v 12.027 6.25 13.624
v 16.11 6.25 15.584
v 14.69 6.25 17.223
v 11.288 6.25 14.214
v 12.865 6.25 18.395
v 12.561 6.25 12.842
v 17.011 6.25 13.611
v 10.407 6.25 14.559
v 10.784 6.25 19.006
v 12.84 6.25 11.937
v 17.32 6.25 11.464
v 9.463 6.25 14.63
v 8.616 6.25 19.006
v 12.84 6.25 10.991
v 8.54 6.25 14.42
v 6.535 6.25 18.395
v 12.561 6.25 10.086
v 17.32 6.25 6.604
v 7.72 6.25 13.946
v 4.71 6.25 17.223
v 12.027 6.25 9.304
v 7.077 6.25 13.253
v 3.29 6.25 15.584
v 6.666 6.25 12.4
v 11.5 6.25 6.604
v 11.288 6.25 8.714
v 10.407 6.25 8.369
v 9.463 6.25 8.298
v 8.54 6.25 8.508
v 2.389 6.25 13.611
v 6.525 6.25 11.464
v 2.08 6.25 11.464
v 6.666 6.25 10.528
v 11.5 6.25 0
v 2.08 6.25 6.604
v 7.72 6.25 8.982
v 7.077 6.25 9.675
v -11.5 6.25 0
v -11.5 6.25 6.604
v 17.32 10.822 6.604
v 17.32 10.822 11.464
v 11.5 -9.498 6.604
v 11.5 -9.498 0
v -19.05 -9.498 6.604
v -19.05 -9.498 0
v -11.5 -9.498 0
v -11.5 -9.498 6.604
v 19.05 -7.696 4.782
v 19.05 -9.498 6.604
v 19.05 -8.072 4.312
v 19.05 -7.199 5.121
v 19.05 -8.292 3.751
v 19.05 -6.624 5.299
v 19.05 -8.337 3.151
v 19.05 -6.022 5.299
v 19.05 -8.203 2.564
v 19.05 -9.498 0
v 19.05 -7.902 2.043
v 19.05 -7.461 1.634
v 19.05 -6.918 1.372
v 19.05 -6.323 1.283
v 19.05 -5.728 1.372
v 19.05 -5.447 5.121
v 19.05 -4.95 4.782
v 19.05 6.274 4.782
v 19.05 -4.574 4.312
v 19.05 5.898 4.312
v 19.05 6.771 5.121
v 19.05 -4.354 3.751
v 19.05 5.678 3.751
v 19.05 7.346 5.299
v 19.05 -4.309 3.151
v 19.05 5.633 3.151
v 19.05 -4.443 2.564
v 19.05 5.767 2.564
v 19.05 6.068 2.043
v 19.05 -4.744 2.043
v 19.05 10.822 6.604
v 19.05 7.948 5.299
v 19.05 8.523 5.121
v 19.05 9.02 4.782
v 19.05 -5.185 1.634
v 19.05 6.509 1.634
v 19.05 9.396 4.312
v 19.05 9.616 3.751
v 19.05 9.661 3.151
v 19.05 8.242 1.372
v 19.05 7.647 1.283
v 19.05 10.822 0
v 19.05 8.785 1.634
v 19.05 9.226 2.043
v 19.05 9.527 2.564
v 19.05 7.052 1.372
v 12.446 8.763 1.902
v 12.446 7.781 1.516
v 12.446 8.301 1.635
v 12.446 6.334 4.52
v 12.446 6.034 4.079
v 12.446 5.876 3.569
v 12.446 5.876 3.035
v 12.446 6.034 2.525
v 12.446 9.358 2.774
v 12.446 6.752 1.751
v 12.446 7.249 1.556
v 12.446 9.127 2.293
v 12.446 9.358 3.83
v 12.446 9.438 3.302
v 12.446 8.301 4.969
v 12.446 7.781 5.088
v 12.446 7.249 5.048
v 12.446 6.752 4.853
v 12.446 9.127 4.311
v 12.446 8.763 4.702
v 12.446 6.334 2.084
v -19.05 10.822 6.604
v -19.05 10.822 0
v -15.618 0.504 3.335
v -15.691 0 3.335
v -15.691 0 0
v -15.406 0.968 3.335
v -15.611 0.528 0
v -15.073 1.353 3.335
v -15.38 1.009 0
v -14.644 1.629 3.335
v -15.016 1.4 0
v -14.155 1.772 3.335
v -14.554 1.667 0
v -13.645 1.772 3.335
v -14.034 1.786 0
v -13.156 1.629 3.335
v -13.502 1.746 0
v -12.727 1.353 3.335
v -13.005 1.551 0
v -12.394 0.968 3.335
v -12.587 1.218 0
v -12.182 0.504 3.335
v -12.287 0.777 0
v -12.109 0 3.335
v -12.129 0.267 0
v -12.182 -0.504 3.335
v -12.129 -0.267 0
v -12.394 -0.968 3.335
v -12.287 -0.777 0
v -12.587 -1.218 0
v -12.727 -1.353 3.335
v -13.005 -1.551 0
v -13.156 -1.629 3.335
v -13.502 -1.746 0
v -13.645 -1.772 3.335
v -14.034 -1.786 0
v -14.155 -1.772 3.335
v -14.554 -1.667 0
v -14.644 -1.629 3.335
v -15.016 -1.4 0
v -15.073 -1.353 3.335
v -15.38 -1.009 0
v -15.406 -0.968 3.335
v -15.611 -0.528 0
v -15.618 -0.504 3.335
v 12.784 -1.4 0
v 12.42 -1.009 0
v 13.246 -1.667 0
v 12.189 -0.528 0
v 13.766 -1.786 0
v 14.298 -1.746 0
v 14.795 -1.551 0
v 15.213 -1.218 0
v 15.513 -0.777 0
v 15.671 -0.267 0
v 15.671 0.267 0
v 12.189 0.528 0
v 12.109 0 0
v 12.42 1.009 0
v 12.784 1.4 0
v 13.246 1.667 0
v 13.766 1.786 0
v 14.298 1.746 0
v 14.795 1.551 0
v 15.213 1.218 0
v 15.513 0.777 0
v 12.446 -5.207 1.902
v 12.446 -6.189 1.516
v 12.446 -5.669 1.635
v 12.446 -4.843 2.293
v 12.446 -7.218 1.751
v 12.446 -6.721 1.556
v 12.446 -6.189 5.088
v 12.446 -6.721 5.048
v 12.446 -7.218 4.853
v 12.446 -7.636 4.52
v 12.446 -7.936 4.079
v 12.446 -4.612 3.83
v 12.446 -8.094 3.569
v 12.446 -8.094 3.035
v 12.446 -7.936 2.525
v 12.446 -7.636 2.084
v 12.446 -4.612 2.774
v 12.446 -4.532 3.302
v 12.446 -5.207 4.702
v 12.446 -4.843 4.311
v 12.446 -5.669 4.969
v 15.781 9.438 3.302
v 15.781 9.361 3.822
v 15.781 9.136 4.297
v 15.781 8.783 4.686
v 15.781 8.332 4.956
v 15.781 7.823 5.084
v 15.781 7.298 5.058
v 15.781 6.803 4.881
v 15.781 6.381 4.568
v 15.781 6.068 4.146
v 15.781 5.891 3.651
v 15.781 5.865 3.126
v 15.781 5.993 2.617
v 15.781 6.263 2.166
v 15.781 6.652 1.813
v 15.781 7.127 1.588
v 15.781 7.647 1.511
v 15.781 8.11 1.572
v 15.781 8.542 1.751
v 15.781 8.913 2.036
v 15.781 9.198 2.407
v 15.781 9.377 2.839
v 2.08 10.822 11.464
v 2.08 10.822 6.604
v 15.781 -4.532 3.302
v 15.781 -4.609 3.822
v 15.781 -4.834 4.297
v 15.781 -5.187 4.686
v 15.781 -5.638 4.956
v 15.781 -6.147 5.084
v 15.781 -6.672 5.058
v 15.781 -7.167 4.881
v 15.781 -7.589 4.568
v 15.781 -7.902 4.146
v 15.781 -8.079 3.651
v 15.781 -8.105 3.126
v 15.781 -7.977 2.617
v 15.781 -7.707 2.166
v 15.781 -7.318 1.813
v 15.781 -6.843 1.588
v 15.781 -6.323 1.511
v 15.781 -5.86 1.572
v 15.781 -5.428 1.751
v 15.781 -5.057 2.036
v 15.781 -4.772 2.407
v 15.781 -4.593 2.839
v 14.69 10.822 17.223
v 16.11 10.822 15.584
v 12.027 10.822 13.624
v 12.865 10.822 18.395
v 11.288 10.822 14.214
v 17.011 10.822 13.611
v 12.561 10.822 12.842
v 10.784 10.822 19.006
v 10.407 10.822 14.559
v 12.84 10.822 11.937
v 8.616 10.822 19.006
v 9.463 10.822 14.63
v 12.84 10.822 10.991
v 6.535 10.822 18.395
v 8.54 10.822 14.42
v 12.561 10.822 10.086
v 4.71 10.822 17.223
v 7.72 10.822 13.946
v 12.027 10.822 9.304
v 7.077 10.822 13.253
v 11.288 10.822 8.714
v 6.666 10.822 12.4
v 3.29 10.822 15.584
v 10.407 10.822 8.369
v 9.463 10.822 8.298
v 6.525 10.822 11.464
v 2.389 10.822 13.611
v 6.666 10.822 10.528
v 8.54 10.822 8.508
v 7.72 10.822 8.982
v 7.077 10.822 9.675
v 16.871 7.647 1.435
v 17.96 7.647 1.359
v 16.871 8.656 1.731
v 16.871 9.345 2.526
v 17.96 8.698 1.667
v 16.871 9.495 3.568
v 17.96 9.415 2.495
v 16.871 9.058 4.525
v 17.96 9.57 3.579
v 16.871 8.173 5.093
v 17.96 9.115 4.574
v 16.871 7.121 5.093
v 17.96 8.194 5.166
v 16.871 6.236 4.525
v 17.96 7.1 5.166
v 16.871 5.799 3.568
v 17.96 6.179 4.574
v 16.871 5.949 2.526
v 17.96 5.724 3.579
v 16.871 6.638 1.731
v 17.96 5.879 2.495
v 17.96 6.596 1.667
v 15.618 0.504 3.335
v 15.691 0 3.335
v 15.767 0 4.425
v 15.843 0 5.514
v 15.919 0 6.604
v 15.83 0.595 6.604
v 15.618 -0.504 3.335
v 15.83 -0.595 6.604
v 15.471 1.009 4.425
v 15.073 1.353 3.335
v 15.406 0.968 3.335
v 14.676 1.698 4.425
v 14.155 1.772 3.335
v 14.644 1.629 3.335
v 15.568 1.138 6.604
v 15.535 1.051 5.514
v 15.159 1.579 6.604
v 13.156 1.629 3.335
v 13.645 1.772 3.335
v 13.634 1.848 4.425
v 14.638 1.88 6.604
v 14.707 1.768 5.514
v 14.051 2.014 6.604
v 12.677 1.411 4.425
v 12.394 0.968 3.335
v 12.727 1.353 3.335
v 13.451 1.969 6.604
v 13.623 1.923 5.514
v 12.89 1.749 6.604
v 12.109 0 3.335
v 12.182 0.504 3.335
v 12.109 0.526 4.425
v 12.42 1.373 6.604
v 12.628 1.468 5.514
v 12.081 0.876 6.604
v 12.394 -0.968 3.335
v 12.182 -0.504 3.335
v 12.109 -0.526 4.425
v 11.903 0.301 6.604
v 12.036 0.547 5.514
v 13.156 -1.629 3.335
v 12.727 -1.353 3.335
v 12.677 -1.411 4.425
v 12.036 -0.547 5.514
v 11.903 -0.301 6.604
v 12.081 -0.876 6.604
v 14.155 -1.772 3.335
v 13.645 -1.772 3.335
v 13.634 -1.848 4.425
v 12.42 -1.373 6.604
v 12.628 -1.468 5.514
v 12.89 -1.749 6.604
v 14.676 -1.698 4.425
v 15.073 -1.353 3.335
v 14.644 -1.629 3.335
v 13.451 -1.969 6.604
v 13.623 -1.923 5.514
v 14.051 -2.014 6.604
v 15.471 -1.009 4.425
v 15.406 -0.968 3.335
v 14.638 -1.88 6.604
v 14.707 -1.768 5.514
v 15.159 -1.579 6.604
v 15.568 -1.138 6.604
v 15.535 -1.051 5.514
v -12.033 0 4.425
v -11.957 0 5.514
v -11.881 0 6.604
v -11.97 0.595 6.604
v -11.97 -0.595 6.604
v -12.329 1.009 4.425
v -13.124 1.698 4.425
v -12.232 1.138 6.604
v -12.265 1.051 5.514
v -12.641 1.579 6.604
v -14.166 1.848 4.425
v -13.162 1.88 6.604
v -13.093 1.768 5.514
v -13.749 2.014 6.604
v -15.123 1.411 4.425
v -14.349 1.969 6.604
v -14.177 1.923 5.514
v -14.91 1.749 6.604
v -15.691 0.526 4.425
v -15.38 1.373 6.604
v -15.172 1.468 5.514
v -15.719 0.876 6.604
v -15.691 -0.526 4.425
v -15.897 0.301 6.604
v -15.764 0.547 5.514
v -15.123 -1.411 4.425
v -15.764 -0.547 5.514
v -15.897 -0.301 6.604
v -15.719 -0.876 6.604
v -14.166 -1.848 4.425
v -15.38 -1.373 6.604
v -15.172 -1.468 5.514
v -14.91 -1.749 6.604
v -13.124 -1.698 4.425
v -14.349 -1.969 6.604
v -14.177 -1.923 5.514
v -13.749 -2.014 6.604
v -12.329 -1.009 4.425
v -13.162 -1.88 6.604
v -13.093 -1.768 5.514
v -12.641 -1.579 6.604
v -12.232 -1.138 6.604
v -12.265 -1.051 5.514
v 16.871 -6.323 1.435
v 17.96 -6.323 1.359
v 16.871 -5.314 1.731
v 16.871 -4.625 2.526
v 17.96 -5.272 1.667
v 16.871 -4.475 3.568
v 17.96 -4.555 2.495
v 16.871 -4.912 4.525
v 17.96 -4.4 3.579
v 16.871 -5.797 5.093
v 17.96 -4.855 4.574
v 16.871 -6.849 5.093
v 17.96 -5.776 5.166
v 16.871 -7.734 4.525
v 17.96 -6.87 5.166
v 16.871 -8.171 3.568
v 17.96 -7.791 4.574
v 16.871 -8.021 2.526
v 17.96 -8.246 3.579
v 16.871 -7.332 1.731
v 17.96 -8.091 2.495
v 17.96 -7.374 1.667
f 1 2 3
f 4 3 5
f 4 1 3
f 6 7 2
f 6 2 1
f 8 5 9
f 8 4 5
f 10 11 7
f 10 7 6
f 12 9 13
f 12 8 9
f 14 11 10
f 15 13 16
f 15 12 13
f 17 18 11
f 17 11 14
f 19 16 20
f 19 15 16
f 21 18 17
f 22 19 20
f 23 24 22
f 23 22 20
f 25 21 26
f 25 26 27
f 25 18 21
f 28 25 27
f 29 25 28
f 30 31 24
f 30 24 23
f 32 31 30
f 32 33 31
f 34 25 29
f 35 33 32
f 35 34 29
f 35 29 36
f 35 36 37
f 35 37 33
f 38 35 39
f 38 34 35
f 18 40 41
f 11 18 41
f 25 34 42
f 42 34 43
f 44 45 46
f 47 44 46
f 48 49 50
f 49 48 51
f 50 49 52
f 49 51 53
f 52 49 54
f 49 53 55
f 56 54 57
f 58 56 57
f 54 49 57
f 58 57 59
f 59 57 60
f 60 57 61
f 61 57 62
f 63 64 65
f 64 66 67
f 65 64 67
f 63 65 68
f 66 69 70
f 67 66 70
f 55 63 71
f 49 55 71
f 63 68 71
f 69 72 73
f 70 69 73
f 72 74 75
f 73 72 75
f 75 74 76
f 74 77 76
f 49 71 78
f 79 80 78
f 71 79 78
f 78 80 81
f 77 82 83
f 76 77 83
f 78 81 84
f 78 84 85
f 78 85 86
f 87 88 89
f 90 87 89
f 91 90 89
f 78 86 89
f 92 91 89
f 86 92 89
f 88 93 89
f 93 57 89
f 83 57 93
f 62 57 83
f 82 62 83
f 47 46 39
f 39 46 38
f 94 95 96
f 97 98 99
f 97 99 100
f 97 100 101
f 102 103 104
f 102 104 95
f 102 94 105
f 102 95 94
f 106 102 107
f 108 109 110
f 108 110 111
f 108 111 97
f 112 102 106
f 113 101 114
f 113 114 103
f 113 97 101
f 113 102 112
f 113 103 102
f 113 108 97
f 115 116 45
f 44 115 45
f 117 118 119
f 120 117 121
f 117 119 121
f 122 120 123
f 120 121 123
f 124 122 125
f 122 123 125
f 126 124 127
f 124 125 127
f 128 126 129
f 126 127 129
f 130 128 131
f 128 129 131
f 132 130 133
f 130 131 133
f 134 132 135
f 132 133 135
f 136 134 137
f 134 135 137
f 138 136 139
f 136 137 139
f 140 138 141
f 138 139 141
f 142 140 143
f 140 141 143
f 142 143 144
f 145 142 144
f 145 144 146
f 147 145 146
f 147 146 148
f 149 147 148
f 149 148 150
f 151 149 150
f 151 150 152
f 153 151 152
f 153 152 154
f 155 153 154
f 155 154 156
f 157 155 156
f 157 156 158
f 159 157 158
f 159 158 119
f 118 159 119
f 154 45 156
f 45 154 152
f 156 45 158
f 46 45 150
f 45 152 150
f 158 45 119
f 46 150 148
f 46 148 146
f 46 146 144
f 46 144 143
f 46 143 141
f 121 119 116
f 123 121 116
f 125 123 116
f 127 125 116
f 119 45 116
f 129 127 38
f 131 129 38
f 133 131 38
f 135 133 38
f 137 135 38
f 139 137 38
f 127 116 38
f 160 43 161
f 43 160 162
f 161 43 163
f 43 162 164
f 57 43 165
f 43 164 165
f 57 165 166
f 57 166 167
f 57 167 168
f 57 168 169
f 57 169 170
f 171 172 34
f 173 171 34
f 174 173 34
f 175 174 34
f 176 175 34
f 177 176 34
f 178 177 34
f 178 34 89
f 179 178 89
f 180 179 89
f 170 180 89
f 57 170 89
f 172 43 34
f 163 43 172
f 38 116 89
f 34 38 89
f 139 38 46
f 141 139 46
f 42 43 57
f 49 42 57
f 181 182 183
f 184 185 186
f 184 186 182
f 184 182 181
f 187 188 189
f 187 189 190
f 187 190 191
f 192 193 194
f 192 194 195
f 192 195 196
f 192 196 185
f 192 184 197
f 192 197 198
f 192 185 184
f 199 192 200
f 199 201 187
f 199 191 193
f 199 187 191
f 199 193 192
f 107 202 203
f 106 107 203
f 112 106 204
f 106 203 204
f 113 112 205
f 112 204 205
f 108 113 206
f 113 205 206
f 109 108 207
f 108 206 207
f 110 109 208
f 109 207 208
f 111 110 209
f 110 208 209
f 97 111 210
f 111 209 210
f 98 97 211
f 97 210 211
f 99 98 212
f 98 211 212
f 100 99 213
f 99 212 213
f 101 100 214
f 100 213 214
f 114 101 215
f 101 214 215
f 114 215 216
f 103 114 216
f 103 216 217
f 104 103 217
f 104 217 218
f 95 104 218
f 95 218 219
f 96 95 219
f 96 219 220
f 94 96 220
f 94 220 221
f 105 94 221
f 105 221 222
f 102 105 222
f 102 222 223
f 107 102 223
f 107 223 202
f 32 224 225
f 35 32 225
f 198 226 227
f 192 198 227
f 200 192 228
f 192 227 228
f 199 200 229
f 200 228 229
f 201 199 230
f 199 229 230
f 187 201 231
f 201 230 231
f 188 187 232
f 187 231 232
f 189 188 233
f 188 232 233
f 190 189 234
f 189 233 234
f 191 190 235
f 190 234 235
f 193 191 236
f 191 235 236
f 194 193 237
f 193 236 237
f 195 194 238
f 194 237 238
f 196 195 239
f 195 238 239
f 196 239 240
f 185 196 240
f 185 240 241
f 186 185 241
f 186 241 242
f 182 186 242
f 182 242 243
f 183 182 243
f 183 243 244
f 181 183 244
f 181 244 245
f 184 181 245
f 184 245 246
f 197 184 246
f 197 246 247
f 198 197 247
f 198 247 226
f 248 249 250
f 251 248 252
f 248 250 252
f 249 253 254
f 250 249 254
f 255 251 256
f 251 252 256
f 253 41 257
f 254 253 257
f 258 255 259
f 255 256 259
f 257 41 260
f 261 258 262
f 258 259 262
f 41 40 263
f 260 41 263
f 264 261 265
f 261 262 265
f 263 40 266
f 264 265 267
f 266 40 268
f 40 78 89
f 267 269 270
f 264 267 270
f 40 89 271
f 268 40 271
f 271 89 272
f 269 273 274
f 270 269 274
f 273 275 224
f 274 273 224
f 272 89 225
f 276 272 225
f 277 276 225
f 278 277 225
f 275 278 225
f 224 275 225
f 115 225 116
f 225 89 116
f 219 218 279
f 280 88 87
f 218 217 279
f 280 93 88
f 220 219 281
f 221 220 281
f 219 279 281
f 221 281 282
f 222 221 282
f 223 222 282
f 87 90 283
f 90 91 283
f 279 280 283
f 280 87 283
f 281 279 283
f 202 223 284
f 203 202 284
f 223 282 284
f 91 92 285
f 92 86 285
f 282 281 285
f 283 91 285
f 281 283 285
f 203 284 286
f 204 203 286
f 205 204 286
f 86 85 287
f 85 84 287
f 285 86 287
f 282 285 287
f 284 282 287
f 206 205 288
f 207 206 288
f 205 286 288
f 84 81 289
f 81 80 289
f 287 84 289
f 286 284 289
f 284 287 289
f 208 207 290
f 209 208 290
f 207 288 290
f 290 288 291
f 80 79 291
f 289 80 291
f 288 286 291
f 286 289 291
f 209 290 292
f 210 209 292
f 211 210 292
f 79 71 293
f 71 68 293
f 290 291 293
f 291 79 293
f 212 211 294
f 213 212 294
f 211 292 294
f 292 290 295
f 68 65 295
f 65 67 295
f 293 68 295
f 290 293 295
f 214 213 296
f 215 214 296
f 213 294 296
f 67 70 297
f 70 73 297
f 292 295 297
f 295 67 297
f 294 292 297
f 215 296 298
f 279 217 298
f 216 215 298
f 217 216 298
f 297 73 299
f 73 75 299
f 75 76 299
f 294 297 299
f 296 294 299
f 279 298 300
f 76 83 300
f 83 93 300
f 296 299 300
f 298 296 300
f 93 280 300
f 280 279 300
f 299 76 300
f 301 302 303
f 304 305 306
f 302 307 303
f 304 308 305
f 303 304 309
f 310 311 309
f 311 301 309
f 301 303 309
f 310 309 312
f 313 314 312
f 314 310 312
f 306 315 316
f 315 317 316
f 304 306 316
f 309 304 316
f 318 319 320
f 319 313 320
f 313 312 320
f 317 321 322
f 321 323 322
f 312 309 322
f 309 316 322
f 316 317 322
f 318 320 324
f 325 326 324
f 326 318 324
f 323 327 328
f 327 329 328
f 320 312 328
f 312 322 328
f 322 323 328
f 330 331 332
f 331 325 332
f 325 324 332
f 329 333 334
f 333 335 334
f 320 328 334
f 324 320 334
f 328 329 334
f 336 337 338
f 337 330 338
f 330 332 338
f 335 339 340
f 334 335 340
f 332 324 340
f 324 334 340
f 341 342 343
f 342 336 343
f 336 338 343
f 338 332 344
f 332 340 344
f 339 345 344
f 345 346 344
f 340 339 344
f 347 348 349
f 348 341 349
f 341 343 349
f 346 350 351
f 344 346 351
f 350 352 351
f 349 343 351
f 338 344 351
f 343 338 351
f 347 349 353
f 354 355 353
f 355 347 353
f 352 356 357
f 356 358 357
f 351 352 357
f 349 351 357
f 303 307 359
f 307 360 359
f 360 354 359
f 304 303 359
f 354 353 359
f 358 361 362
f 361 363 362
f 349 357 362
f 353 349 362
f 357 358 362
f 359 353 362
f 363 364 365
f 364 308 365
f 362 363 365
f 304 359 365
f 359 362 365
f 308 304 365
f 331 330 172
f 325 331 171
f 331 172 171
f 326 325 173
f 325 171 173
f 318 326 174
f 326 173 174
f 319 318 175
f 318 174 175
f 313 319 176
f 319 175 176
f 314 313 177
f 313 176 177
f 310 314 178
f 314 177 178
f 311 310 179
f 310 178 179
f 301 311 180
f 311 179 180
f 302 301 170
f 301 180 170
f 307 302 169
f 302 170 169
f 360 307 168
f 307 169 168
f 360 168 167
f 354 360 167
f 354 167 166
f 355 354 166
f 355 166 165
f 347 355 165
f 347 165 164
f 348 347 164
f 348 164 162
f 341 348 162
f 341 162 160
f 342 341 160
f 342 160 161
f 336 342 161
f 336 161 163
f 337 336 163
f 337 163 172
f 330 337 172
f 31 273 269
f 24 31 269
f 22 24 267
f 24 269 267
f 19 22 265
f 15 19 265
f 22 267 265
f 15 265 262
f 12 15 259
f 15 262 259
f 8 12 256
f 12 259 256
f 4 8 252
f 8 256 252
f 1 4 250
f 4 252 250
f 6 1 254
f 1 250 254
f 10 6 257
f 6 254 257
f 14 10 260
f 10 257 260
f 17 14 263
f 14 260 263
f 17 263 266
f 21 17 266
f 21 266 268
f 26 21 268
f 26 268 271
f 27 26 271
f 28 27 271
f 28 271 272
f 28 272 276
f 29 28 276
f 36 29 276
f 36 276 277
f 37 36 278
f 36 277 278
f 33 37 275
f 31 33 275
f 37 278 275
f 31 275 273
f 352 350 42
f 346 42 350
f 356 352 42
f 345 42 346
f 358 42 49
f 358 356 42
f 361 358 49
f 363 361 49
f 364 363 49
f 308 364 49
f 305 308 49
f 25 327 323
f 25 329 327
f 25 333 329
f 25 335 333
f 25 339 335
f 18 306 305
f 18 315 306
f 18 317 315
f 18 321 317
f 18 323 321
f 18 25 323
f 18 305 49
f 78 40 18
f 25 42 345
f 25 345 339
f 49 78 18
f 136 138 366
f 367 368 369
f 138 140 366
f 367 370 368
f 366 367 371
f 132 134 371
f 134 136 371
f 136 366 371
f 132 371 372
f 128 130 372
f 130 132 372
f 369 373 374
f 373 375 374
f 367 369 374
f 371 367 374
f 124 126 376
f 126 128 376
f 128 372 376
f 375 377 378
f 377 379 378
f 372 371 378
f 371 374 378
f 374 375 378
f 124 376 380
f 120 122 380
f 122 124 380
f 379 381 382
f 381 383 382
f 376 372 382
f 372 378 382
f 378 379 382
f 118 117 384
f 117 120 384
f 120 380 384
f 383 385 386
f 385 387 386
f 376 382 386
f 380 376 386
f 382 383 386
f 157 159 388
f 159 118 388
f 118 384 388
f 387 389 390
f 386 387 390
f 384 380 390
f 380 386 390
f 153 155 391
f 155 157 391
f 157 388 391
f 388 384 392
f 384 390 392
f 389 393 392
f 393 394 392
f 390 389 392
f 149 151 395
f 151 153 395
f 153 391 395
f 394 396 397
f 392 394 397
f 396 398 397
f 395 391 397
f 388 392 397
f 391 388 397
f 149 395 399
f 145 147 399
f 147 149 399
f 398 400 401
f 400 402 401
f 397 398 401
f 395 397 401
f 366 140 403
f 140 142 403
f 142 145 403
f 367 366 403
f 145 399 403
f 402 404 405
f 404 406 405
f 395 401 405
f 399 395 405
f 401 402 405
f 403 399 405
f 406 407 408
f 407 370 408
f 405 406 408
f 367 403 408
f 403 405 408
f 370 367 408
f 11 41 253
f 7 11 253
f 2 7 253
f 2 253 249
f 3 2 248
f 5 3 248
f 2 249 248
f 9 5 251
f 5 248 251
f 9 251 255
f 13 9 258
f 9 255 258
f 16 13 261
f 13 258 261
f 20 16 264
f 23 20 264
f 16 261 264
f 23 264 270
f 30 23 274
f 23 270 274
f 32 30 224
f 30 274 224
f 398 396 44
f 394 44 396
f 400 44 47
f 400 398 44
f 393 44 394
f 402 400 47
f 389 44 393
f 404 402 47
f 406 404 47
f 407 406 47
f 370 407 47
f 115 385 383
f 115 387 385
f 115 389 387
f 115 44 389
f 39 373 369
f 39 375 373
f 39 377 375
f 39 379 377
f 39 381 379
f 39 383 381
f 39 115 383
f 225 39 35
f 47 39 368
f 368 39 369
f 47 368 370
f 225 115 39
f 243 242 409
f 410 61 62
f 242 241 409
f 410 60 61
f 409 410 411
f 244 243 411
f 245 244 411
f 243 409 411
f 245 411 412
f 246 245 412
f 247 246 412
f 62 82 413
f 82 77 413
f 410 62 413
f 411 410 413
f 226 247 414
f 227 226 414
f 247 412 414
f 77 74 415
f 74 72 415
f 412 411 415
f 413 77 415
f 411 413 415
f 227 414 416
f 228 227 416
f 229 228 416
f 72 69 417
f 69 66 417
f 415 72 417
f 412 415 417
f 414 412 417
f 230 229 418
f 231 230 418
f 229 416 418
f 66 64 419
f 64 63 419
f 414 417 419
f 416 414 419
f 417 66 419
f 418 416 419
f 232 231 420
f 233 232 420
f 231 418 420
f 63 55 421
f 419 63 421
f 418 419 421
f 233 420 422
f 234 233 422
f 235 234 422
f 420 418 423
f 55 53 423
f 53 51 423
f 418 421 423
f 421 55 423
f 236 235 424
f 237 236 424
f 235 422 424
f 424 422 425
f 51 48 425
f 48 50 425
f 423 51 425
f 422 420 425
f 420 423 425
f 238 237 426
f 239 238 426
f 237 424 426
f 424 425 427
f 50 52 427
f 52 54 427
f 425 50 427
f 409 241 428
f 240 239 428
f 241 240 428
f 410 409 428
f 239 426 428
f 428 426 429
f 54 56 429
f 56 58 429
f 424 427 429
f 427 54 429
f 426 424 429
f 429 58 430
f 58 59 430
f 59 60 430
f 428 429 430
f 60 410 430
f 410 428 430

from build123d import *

# Parameters (mm, degrees)
BOSS_EXTRUDE1_DEPTH          = 6.604
SKETCH2_R                    = 3.175
BOSS_EXTRUDE2_DEPTH          = 4.572
SKETCH3_R                    = 1.7907
CUT_EXTRUDE1_DEPTH           = 30.055416707
SKETCH4_R                    = 2.0193
CUT_EXTRUDE2_DEPTH           = 26.214451888
CUT_EXTRUDE2_DRAFT           = -4
CUT_EXTRUDE2_PROFILE_2_DEPTH = 26.214451888
CUT_EXTRUDE2_PROFILE_2_DRAFT = -4
SKETCH5_R                    = 1.7907
CUT_EXTRUDE3_DEPTH           = 6.604
SKETCH6_R                    = 2.0193
CUT_EXTRUDE4_DEPTH           = 6.604
CUT_EXTRUDE4_DRAFT           = -4
CUT_EXTRUDE4_PROFILE_2_DEPTH = 6.604
CUT_EXTRUDE4_PROFILE_2_DRAFT = -4


with BuildPart() as part:
    # Sketch1 → Boss-Extrude1 (new body)
    with BuildSketch(Plane.XY):
        Polygon((-11.5, -6.25), (-11.5, 6.25), (11.5, 6.25), (11.5, -6.25), (11.5, -9.498), (19.05, -9.498), (19.05, -6.25), (19.05, 10.822), (-19.05, 10.822), (-19.05, -6.25), (-19.05, -9.498), (-11.5, -9.498), align=None)
    extrude(amount=BOSS_EXTRUDE1_DEPTH)

    # Sketch2 → Boss-Extrude2 (add)
    with BuildSketch(Plane(origin=(0, 10.822, 0), x_dir=(1, 0, 0), z_dir=(0, 1, 0))):
        with BuildLine():
            Line((2.08, -11.464), (2.08, -6.604))
            Line((2.08, -6.604), (17.32, -6.604))
            Line((17.32, -6.604), (17.32, -11.464))
            ThreePointArc((17.32, -11.464), (9.7, -19.084), (2.08, -11.464))
        make_face()
        with Locations(Location((9.7, -11.464, 0), (0, 0, 180))):
            Circle(SKETCH2_R, mode=Mode.SUBTRACT)
    extrude(amount=-BOSS_EXTRUDE2_DEPTH)

    # Sketch3 → Cut-Extrude1 (cut, through all)
    with BuildSketch(Plane(origin=(0, 0, 0), x_dir=(-1, 0, 0), z_dir=(0, 0, -1))):
        with Locations((13.9, 0)):
            Circle(SKETCH3_R)
        with Locations((-13.9, 0)):
            Circle(SKETCH3_R)
    extrude(amount=-CUT_EXTRUDE1_DEPTH, mode=Mode.SUBTRACT)


with BuildPart() as cut_extrude2_tool:
    # Sketch4 → Cut-Extrude2 (with draft: the straight prism first)
    with BuildSketch(Plane.XY.offset(6.604)):
        with Locations((-13.9, 0)):
            Circle(SKETCH4_R)
    extrude(amount=-CUT_EXTRUDE2_DEPTH)
    # Cut-Extrude2: the draft: its side faces are tilted about the plane it starts from
    cut_extrude2_sides = [cut_extrude2_tool.faces().sort_by_distance(p)[0] for p in [
        (-15.9193, 0, -6.503225944),
    ]]
    draft(cut_extrude2_sides, Plane.XY.offset(6.604), CUT_EXTRUDE2_DRAFT)


with BuildPart() as part_1:
    add(part.part)

    # Cut-Extrude2: cut by cut_extrude2_tool
    add(cut_extrude2_tool.part, mode=Mode.SUBTRACT)


with BuildPart() as cut_extrude2_profile_2_tool:
    # Sketch4 → Cut-Extrude2 profile 2 (with draft: the straight prism first)
    with BuildSketch(Plane.XY.offset(6.604)):
        with Locations((13.9, 0)):
            Circle(SKETCH4_R)
    extrude(amount=-CUT_EXTRUDE2_PROFILE_2_DEPTH)
    # Cut-Extrude2 profile 2: the draft: its side faces are tilted about the plane it starts from
    cut_extrude2_profile_2_sides = [cut_extrude2_profile_2_tool.faces().sort_by_distance(p)[0] for p in [
        (11.8807, 0, -6.503225944),
    ]]
    draft(cut_extrude2_profile_2_sides, Plane.XY.offset(6.604), CUT_EXTRUDE2_PROFILE_2_DRAFT)


with BuildPart() as part_2:
    add(part_1.part)

    # Cut-Extrude2 profile 2: cut by cut_extrude2_profile_2_tool
    add(cut_extrude2_profile_2_tool.part, mode=Mode.SUBTRACT)

    # Sketch5 → Cut-Extrude3 (cut)
    with BuildSketch(Plane(origin=(19.05, 0, 0), x_dir=(0, 0, -1), z_dir=(1, 0, 0))):
        with Locations(Location((-3.302, 7.647, 0), (0, 0, 90))):
            Circle(SKETCH5_R)
        with Locations(Location((-3.302, -6.323, 0), (0, 0, 90))):
            Circle(SKETCH5_R)
    extrude(amount=-CUT_EXTRUDE3_DEPTH, mode=Mode.SUBTRACT)


with BuildPart() as cut_extrude4_tool:
    # Sketch6 → Cut-Extrude4 (with draft: the straight prism first)
    with BuildSketch(Plane(origin=(19.05, 0, 0), x_dir=(0, 0, -1), z_dir=(1, 0, 0))):
        with Locations((-3.302, 7.647)):
            Circle(SKETCH6_R)
    extrude(amount=-CUT_EXTRUDE4_DEPTH)
    # Cut-Extrude4: the draft: its side faces are tilted about the plane it starts from
    cut_extrude4_sides = [cut_extrude4_tool.faces().sort_by_distance(p)[0] for p in [
        (15.748, 7.647, 5.3213),
    ]]
    draft(cut_extrude4_sides, Plane(origin=(19.05, 0, 0), x_dir=(0, 0, -1), z_dir=(1, 0, 0)), CUT_EXTRUDE4_DRAFT)


with BuildPart() as part_3:
    add(part_2.part)

    # Cut-Extrude4: cut by cut_extrude4_tool
    add(cut_extrude4_tool.part, mode=Mode.SUBTRACT)


with BuildPart() as cut_extrude4_profile_2_tool:
    # Sketch6 → Cut-Extrude4 profile 2 (with draft: the straight prism first)
    with BuildSketch(Plane(origin=(19.05, 0, 0), x_dir=(0, 0, -1), z_dir=(1, 0, 0))):
        with Locations((-3.302, -6.323)):
            Circle(SKETCH6_R)
    extrude(amount=-CUT_EXTRUDE4_PROFILE_2_DEPTH)
    # Cut-Extrude4 profile 2: the draft: its side faces are tilted about the plane it starts from
    cut_extrude4_profile_2_sides = [cut_extrude4_profile_2_tool.faces().sort_by_distance(p)[0] for p in [
        (15.748, -6.323, 5.3213),
    ]]
    draft(cut_extrude4_profile_2_sides, Plane(origin=(19.05, 0, 0), x_dir=(0, 0, -1), z_dir=(1, 0, 0)), CUT_EXTRUDE4_PROFILE_2_DRAFT)


with BuildPart() as part_4:
    add(part_3.part)

    # Cut-Extrude4 profile 2: cut by cut_extrude4_profile_2_tool
    add(cut_extrude4_profile_2_tool.part, mode=Mode.SUBTRACT)


solid = part_4.part
